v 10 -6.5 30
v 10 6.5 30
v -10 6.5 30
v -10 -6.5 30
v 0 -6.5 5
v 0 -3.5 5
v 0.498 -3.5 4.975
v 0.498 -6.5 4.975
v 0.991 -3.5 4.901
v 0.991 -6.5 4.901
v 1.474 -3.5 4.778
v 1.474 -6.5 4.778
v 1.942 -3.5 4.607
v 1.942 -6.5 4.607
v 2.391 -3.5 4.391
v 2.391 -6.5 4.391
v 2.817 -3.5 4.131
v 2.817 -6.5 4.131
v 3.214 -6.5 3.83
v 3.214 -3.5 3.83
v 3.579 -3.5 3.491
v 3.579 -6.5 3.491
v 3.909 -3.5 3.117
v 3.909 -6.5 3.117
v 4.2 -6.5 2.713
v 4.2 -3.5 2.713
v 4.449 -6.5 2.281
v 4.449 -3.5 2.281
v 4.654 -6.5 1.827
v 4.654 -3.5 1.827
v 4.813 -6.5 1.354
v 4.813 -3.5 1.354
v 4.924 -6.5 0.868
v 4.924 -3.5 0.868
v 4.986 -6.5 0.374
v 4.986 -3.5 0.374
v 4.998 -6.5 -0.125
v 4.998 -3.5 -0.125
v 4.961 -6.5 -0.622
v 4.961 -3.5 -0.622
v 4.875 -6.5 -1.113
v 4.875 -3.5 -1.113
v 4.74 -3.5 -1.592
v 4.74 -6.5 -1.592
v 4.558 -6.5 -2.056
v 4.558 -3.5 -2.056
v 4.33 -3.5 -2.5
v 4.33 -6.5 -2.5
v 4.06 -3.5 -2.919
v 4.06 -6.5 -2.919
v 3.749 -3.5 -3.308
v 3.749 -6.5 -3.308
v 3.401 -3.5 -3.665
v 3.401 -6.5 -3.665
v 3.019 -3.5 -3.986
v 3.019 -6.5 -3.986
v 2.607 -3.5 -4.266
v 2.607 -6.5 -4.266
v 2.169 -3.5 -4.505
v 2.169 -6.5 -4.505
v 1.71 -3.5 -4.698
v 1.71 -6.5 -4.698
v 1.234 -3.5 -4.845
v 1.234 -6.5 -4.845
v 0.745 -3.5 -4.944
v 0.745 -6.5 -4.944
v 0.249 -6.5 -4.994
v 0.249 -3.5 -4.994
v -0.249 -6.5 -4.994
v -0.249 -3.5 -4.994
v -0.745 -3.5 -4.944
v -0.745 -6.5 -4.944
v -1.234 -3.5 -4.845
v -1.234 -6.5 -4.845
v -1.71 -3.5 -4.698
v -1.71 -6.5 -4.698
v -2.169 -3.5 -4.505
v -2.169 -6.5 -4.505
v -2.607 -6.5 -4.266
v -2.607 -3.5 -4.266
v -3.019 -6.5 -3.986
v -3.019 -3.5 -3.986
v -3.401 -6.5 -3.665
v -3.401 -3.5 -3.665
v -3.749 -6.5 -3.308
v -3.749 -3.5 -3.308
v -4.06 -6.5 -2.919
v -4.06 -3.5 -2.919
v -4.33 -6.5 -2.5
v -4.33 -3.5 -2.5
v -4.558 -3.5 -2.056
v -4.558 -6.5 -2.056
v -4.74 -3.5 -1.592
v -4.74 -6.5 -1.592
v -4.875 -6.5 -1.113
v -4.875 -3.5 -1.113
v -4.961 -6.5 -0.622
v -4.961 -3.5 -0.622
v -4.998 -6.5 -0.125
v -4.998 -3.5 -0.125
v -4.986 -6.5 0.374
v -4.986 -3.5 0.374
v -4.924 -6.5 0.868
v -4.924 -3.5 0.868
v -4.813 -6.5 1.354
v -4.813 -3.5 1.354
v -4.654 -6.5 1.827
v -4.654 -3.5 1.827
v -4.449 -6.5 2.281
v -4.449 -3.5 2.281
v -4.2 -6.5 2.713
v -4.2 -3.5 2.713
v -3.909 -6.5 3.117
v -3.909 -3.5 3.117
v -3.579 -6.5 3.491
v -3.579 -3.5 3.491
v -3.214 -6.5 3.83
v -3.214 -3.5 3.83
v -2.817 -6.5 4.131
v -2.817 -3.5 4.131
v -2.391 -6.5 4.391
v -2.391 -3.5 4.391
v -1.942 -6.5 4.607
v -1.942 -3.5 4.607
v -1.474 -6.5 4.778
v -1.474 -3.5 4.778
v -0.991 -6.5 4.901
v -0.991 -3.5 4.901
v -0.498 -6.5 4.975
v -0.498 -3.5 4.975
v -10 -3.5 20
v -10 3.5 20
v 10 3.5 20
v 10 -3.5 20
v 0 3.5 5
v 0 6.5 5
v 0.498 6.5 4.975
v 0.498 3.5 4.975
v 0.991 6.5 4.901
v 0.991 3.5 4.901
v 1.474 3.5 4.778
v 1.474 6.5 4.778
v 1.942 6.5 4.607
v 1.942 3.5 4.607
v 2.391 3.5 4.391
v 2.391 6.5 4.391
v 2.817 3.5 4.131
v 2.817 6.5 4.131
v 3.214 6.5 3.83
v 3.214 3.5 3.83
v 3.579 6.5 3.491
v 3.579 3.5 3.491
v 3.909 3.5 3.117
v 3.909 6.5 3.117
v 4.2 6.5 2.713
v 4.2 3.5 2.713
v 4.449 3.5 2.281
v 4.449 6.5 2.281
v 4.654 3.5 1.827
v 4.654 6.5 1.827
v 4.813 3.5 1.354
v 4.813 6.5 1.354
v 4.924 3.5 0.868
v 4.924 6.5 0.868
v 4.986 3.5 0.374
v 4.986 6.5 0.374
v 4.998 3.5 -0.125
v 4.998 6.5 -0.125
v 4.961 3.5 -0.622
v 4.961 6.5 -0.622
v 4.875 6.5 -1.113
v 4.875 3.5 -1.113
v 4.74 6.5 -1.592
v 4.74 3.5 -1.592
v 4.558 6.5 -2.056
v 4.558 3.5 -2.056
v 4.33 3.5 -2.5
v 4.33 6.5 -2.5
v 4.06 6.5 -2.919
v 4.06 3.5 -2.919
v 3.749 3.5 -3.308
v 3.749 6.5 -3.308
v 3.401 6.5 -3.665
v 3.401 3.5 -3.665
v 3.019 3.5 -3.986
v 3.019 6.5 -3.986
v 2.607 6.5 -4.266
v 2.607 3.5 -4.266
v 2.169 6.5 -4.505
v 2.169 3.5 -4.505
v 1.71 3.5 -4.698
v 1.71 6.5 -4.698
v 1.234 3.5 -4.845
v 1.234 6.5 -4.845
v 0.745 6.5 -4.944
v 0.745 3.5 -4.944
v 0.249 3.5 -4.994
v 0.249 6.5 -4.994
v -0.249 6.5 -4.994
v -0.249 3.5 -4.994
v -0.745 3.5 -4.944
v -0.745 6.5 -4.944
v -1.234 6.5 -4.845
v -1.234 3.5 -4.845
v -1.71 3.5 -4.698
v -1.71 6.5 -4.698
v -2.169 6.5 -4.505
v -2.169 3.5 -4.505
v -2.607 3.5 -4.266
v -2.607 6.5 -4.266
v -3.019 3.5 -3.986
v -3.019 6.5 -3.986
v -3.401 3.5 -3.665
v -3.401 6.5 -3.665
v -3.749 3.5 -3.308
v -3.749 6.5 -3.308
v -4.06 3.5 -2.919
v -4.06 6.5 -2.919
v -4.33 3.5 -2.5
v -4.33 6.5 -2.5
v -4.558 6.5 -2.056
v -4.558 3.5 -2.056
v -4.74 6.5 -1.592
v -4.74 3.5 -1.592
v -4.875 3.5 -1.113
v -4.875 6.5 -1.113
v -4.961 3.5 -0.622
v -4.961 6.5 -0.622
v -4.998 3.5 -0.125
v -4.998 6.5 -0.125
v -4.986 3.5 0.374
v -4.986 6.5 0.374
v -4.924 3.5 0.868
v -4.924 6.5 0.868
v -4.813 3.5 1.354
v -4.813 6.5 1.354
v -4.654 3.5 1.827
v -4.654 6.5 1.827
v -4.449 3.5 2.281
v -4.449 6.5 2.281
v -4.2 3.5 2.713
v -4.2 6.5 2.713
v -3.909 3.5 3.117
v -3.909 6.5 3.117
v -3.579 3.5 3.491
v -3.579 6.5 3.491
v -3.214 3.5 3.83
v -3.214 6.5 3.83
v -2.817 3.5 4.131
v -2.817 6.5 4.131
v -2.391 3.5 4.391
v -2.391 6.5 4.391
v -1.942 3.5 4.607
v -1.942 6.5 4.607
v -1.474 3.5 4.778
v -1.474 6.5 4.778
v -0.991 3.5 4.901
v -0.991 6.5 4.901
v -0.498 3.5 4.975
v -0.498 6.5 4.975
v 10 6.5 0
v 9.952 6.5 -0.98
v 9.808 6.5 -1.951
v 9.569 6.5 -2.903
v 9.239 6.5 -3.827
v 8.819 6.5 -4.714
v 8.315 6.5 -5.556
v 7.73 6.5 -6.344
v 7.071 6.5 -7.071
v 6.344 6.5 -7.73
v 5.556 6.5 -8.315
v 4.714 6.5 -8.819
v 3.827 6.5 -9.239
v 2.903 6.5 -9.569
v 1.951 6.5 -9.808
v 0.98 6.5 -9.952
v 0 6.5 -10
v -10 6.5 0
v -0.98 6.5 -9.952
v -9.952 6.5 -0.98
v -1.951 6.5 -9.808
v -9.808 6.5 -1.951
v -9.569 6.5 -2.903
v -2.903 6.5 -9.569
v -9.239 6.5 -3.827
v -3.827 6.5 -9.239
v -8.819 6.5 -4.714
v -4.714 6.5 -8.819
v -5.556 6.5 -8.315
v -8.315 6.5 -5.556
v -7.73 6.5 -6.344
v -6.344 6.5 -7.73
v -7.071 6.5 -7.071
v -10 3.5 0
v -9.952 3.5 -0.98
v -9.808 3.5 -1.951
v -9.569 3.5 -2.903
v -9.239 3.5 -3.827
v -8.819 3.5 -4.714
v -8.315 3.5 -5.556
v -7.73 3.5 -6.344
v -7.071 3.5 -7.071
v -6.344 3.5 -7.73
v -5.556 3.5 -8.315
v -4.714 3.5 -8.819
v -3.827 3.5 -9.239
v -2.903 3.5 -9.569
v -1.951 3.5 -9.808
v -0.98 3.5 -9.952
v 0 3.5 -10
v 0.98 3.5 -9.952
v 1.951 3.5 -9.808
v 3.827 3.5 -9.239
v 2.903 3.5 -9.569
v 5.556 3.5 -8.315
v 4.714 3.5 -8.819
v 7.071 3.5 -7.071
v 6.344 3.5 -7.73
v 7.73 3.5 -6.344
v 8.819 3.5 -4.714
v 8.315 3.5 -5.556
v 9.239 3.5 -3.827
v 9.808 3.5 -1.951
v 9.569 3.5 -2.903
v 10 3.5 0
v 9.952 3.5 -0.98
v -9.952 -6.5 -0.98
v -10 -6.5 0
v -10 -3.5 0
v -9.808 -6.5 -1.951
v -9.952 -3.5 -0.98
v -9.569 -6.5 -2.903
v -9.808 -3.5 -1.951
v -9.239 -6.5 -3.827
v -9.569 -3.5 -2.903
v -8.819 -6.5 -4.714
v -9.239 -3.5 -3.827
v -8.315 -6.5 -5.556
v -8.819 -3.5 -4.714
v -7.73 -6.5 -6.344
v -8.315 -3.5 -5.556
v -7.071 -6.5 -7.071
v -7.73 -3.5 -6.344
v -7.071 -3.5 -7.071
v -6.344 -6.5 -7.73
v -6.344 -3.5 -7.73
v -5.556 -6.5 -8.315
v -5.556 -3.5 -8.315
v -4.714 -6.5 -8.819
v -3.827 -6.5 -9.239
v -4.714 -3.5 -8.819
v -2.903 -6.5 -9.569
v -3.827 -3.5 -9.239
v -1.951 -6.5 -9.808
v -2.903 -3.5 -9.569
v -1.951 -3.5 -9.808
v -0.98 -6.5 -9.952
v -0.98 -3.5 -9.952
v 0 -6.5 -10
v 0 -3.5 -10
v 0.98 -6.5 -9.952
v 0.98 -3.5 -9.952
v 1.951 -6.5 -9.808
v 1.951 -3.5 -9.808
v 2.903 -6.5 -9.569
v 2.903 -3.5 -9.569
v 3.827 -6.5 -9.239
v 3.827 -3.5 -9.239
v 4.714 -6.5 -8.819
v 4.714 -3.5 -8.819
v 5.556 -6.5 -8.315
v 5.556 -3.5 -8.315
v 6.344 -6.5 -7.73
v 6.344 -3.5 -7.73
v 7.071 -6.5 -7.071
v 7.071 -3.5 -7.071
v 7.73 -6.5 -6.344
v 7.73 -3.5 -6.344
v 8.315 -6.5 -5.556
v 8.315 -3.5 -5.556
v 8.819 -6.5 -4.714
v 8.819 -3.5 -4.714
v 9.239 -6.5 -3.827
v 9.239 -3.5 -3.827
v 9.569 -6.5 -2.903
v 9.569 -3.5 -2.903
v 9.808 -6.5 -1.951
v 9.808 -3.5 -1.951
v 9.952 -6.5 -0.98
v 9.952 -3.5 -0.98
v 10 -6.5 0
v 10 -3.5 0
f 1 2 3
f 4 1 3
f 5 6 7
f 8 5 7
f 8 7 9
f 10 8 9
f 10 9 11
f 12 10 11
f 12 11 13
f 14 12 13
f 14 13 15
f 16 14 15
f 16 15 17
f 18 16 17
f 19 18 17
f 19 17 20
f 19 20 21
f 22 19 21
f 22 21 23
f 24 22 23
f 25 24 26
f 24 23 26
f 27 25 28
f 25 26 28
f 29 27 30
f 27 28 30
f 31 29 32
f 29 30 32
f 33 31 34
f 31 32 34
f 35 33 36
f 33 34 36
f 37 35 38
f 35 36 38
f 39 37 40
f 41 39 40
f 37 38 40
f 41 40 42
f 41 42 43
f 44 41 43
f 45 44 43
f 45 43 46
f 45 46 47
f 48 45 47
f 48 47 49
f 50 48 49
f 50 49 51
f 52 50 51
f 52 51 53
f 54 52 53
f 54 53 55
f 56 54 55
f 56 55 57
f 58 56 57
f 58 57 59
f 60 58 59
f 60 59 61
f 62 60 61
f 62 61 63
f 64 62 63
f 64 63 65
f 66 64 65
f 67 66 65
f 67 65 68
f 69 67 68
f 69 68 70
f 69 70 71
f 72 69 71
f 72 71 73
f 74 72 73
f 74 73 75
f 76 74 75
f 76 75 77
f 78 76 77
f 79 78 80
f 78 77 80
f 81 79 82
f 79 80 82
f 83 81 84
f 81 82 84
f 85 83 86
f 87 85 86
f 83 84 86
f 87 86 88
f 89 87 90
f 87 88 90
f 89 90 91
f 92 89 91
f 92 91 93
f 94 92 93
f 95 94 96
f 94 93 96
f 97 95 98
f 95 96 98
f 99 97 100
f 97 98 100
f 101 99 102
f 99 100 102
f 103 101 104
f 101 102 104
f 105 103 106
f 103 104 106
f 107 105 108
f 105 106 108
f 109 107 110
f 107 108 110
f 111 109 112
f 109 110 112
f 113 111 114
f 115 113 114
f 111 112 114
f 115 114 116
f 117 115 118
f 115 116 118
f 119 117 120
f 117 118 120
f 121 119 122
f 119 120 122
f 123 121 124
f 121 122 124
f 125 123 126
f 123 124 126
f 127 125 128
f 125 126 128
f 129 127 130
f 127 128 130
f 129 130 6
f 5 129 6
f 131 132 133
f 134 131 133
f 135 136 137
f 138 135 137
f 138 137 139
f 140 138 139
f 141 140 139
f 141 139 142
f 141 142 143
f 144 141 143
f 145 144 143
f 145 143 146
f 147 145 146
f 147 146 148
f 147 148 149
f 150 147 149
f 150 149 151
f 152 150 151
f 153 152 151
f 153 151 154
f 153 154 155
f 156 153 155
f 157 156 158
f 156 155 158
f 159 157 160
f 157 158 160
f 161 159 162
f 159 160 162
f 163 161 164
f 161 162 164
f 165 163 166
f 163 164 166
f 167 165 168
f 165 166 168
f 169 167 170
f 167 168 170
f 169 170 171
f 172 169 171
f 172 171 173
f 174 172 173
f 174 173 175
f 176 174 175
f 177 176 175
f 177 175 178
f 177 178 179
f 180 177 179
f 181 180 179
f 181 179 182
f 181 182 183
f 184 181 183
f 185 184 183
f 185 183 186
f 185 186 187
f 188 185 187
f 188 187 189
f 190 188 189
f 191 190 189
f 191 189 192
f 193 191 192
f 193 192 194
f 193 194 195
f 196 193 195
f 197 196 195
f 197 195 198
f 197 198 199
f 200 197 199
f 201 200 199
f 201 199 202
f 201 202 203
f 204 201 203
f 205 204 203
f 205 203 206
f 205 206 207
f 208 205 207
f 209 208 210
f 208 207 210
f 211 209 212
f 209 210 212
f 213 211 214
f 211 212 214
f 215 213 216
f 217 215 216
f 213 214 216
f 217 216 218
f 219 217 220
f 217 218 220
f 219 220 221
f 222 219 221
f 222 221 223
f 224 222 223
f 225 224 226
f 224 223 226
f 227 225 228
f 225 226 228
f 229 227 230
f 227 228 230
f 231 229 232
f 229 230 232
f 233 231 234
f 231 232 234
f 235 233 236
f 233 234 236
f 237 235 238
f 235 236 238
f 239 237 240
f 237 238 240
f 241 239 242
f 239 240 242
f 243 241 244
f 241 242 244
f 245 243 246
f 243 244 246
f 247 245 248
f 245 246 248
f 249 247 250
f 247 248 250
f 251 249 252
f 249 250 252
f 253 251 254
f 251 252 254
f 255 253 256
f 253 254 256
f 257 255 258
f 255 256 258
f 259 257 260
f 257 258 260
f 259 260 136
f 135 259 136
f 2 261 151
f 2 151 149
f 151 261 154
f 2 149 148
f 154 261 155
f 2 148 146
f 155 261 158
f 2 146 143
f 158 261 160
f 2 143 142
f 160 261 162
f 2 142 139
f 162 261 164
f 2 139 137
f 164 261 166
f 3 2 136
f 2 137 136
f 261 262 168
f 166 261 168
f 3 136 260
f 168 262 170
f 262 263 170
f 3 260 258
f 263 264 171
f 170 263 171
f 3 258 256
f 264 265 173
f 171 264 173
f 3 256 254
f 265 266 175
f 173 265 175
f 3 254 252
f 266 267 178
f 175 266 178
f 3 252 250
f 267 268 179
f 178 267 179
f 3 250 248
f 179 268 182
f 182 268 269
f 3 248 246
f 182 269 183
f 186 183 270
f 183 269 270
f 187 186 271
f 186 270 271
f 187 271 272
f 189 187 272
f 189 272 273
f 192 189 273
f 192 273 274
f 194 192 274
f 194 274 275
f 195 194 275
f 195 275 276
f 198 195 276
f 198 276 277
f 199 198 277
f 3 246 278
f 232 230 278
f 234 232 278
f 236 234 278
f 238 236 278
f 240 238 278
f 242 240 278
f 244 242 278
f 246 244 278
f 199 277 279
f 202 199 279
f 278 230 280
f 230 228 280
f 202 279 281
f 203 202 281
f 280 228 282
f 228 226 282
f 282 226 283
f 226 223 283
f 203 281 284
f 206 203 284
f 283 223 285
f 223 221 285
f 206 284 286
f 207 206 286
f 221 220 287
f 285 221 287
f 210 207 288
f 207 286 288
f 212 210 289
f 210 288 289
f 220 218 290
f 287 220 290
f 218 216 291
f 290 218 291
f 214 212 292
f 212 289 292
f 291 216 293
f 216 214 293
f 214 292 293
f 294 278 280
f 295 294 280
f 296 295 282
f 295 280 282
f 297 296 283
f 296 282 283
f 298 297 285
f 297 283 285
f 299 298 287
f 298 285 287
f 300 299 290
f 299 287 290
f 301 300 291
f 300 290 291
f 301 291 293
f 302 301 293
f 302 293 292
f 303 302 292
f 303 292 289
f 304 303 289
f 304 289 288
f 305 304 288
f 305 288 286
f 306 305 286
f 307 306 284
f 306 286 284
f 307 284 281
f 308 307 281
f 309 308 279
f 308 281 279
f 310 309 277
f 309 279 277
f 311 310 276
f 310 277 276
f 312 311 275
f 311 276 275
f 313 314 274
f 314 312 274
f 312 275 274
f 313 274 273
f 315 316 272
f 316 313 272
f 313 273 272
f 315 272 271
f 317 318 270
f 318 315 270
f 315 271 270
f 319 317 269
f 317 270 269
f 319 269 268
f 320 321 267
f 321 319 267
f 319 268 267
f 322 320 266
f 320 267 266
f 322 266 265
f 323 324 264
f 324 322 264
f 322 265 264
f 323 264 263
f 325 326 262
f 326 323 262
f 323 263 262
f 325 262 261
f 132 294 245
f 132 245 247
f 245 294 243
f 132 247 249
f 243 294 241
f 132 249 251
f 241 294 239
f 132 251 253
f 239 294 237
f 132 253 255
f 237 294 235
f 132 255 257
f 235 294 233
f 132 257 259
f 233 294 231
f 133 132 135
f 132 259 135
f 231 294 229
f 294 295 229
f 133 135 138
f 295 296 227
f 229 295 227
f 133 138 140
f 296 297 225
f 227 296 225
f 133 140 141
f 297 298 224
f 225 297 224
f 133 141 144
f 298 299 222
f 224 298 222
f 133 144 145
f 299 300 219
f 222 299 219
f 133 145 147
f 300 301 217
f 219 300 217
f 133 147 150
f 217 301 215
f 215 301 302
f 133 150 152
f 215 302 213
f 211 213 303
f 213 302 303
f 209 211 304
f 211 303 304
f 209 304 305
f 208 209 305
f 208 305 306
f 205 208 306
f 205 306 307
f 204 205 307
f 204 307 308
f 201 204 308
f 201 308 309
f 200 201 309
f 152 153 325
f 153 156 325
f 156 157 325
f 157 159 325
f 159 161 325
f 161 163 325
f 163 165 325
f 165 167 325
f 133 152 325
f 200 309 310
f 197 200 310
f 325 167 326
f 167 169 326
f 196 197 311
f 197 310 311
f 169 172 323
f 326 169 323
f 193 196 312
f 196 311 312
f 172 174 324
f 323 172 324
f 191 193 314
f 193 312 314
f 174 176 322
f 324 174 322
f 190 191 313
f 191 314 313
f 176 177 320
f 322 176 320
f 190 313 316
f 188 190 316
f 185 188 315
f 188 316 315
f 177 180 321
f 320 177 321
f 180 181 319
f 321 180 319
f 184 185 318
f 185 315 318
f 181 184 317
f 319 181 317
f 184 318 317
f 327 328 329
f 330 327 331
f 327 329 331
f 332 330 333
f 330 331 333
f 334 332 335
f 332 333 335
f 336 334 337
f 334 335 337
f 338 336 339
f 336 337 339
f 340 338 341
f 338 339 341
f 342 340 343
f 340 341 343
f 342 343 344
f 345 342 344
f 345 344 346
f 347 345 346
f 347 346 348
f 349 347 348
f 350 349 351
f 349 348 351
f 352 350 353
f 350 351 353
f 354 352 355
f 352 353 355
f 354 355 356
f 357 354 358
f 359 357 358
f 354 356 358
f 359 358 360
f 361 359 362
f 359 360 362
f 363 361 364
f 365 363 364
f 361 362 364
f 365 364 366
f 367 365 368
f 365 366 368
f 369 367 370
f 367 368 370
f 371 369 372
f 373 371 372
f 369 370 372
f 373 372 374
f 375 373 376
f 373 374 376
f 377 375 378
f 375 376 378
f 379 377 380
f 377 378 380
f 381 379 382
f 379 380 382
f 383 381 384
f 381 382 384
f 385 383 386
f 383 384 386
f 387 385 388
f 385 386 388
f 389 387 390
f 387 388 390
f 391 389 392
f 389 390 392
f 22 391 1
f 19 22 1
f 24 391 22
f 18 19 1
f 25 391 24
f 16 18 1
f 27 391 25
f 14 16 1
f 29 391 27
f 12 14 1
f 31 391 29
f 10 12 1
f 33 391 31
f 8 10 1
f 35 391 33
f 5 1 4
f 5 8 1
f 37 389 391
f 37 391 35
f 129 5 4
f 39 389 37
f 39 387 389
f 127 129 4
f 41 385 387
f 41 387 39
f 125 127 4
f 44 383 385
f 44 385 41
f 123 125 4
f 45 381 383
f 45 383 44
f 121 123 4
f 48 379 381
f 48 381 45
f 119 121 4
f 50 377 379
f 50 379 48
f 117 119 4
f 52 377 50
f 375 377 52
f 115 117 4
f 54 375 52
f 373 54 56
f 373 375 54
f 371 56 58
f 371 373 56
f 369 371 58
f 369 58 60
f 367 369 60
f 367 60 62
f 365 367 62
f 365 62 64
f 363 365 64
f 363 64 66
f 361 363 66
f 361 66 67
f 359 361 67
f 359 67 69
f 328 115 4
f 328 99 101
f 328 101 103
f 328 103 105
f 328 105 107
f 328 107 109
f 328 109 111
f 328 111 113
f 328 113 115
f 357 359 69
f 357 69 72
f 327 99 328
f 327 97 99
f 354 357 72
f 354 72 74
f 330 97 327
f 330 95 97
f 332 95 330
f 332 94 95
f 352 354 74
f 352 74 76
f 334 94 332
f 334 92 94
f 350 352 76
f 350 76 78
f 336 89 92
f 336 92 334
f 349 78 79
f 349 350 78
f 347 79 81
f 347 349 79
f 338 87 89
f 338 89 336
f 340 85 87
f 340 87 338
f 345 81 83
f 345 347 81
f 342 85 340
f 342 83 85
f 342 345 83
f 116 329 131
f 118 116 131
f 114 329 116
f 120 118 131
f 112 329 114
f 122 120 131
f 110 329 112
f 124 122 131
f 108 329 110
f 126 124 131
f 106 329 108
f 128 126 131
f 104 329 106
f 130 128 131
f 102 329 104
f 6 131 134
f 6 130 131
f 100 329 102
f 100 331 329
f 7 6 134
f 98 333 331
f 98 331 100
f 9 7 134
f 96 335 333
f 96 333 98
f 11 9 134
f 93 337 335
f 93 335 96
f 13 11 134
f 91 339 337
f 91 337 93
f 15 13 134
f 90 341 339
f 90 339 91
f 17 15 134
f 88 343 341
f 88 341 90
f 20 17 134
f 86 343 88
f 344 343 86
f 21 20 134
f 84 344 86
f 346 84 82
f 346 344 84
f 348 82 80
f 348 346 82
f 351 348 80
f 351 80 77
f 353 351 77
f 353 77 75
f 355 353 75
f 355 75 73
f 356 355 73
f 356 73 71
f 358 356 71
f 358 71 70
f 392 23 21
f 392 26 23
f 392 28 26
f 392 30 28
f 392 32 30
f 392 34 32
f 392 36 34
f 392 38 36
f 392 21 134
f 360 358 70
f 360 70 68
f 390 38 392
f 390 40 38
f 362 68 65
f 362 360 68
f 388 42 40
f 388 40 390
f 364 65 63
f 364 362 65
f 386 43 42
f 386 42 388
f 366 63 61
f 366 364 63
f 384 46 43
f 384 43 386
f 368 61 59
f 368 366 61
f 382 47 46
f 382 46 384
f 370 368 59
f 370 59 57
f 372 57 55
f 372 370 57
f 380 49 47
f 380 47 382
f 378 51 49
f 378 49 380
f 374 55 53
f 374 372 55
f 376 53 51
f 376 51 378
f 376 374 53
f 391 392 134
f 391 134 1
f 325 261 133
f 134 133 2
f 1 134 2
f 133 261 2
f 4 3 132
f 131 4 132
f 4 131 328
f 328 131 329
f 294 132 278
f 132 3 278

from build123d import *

# Parameters (mm, degrees)
BOSS_EXTRU_1_DEPTH           = 6.5
ENL_V_MAT_EXTRU_1_DEPTH      = 20
ENL_V_MAT_EXTRU_1_DEPTH_BACK = 33.283896915
ESQUISSE4_W                  = 20
ESQUISSE4_H                  = 7
ESQUISSE5_R                  = 5
ENL_V_MAT_EXTRU_2_DEPTH      = 35.190641995


with BuildPart() as part:
    # Esquisse3 → Boss.-Extru.1 (new, symmetric)
    with BuildSketch(Plane(origin=(0, 0, 0), x_dir=(1, 0, 0), z_dir=(0, 1, 0))):
        with BuildLine():
            Line((-10, -30), (-10, 0))
            ThreePointArc((-10, 0), (0, 10), (10, 0))
            Line((10, 0), (10, -30))
            Line((10, -30), (-10, -30))
        make_face()
    extrude(amount=BOSS_EXTRU_1_DEPTH, both=True)

    # Esquisse4 → Enlèv. mat.-Extru.1 (cut, two sides: drawn at the far end of the back side and taken through both)
    with BuildSketch(Plane.XY.offset(-ENL_V_MAT_EXTRU_1_DEPTH_BACK)):
        Rectangle(ESQUISSE4_W, ESQUISSE4_H)
    extrude(amount=ENL_V_MAT_EXTRU_1_DEPTH + ENL_V_MAT_EXTRU_1_DEPTH_BACK, mode=Mode.SUBTRACT)

    # Esquisse5 → Enlèv. mat.-Extru.2 (cut, through all)
    with BuildSketch(Plane(origin=(0, 6.5, 0), x_dir=(1, 0, 0), z_dir=(0, 1, 0))):
        with Locations(Location((0, 0, 0), (0, 0, 270))):
            Circle(ESQUISSE5_R)
    extrude(amount=-ENL_V_MAT_EXTRU_2_DEPTH, mode=Mode.SUBTRACT)


solid = part.part
